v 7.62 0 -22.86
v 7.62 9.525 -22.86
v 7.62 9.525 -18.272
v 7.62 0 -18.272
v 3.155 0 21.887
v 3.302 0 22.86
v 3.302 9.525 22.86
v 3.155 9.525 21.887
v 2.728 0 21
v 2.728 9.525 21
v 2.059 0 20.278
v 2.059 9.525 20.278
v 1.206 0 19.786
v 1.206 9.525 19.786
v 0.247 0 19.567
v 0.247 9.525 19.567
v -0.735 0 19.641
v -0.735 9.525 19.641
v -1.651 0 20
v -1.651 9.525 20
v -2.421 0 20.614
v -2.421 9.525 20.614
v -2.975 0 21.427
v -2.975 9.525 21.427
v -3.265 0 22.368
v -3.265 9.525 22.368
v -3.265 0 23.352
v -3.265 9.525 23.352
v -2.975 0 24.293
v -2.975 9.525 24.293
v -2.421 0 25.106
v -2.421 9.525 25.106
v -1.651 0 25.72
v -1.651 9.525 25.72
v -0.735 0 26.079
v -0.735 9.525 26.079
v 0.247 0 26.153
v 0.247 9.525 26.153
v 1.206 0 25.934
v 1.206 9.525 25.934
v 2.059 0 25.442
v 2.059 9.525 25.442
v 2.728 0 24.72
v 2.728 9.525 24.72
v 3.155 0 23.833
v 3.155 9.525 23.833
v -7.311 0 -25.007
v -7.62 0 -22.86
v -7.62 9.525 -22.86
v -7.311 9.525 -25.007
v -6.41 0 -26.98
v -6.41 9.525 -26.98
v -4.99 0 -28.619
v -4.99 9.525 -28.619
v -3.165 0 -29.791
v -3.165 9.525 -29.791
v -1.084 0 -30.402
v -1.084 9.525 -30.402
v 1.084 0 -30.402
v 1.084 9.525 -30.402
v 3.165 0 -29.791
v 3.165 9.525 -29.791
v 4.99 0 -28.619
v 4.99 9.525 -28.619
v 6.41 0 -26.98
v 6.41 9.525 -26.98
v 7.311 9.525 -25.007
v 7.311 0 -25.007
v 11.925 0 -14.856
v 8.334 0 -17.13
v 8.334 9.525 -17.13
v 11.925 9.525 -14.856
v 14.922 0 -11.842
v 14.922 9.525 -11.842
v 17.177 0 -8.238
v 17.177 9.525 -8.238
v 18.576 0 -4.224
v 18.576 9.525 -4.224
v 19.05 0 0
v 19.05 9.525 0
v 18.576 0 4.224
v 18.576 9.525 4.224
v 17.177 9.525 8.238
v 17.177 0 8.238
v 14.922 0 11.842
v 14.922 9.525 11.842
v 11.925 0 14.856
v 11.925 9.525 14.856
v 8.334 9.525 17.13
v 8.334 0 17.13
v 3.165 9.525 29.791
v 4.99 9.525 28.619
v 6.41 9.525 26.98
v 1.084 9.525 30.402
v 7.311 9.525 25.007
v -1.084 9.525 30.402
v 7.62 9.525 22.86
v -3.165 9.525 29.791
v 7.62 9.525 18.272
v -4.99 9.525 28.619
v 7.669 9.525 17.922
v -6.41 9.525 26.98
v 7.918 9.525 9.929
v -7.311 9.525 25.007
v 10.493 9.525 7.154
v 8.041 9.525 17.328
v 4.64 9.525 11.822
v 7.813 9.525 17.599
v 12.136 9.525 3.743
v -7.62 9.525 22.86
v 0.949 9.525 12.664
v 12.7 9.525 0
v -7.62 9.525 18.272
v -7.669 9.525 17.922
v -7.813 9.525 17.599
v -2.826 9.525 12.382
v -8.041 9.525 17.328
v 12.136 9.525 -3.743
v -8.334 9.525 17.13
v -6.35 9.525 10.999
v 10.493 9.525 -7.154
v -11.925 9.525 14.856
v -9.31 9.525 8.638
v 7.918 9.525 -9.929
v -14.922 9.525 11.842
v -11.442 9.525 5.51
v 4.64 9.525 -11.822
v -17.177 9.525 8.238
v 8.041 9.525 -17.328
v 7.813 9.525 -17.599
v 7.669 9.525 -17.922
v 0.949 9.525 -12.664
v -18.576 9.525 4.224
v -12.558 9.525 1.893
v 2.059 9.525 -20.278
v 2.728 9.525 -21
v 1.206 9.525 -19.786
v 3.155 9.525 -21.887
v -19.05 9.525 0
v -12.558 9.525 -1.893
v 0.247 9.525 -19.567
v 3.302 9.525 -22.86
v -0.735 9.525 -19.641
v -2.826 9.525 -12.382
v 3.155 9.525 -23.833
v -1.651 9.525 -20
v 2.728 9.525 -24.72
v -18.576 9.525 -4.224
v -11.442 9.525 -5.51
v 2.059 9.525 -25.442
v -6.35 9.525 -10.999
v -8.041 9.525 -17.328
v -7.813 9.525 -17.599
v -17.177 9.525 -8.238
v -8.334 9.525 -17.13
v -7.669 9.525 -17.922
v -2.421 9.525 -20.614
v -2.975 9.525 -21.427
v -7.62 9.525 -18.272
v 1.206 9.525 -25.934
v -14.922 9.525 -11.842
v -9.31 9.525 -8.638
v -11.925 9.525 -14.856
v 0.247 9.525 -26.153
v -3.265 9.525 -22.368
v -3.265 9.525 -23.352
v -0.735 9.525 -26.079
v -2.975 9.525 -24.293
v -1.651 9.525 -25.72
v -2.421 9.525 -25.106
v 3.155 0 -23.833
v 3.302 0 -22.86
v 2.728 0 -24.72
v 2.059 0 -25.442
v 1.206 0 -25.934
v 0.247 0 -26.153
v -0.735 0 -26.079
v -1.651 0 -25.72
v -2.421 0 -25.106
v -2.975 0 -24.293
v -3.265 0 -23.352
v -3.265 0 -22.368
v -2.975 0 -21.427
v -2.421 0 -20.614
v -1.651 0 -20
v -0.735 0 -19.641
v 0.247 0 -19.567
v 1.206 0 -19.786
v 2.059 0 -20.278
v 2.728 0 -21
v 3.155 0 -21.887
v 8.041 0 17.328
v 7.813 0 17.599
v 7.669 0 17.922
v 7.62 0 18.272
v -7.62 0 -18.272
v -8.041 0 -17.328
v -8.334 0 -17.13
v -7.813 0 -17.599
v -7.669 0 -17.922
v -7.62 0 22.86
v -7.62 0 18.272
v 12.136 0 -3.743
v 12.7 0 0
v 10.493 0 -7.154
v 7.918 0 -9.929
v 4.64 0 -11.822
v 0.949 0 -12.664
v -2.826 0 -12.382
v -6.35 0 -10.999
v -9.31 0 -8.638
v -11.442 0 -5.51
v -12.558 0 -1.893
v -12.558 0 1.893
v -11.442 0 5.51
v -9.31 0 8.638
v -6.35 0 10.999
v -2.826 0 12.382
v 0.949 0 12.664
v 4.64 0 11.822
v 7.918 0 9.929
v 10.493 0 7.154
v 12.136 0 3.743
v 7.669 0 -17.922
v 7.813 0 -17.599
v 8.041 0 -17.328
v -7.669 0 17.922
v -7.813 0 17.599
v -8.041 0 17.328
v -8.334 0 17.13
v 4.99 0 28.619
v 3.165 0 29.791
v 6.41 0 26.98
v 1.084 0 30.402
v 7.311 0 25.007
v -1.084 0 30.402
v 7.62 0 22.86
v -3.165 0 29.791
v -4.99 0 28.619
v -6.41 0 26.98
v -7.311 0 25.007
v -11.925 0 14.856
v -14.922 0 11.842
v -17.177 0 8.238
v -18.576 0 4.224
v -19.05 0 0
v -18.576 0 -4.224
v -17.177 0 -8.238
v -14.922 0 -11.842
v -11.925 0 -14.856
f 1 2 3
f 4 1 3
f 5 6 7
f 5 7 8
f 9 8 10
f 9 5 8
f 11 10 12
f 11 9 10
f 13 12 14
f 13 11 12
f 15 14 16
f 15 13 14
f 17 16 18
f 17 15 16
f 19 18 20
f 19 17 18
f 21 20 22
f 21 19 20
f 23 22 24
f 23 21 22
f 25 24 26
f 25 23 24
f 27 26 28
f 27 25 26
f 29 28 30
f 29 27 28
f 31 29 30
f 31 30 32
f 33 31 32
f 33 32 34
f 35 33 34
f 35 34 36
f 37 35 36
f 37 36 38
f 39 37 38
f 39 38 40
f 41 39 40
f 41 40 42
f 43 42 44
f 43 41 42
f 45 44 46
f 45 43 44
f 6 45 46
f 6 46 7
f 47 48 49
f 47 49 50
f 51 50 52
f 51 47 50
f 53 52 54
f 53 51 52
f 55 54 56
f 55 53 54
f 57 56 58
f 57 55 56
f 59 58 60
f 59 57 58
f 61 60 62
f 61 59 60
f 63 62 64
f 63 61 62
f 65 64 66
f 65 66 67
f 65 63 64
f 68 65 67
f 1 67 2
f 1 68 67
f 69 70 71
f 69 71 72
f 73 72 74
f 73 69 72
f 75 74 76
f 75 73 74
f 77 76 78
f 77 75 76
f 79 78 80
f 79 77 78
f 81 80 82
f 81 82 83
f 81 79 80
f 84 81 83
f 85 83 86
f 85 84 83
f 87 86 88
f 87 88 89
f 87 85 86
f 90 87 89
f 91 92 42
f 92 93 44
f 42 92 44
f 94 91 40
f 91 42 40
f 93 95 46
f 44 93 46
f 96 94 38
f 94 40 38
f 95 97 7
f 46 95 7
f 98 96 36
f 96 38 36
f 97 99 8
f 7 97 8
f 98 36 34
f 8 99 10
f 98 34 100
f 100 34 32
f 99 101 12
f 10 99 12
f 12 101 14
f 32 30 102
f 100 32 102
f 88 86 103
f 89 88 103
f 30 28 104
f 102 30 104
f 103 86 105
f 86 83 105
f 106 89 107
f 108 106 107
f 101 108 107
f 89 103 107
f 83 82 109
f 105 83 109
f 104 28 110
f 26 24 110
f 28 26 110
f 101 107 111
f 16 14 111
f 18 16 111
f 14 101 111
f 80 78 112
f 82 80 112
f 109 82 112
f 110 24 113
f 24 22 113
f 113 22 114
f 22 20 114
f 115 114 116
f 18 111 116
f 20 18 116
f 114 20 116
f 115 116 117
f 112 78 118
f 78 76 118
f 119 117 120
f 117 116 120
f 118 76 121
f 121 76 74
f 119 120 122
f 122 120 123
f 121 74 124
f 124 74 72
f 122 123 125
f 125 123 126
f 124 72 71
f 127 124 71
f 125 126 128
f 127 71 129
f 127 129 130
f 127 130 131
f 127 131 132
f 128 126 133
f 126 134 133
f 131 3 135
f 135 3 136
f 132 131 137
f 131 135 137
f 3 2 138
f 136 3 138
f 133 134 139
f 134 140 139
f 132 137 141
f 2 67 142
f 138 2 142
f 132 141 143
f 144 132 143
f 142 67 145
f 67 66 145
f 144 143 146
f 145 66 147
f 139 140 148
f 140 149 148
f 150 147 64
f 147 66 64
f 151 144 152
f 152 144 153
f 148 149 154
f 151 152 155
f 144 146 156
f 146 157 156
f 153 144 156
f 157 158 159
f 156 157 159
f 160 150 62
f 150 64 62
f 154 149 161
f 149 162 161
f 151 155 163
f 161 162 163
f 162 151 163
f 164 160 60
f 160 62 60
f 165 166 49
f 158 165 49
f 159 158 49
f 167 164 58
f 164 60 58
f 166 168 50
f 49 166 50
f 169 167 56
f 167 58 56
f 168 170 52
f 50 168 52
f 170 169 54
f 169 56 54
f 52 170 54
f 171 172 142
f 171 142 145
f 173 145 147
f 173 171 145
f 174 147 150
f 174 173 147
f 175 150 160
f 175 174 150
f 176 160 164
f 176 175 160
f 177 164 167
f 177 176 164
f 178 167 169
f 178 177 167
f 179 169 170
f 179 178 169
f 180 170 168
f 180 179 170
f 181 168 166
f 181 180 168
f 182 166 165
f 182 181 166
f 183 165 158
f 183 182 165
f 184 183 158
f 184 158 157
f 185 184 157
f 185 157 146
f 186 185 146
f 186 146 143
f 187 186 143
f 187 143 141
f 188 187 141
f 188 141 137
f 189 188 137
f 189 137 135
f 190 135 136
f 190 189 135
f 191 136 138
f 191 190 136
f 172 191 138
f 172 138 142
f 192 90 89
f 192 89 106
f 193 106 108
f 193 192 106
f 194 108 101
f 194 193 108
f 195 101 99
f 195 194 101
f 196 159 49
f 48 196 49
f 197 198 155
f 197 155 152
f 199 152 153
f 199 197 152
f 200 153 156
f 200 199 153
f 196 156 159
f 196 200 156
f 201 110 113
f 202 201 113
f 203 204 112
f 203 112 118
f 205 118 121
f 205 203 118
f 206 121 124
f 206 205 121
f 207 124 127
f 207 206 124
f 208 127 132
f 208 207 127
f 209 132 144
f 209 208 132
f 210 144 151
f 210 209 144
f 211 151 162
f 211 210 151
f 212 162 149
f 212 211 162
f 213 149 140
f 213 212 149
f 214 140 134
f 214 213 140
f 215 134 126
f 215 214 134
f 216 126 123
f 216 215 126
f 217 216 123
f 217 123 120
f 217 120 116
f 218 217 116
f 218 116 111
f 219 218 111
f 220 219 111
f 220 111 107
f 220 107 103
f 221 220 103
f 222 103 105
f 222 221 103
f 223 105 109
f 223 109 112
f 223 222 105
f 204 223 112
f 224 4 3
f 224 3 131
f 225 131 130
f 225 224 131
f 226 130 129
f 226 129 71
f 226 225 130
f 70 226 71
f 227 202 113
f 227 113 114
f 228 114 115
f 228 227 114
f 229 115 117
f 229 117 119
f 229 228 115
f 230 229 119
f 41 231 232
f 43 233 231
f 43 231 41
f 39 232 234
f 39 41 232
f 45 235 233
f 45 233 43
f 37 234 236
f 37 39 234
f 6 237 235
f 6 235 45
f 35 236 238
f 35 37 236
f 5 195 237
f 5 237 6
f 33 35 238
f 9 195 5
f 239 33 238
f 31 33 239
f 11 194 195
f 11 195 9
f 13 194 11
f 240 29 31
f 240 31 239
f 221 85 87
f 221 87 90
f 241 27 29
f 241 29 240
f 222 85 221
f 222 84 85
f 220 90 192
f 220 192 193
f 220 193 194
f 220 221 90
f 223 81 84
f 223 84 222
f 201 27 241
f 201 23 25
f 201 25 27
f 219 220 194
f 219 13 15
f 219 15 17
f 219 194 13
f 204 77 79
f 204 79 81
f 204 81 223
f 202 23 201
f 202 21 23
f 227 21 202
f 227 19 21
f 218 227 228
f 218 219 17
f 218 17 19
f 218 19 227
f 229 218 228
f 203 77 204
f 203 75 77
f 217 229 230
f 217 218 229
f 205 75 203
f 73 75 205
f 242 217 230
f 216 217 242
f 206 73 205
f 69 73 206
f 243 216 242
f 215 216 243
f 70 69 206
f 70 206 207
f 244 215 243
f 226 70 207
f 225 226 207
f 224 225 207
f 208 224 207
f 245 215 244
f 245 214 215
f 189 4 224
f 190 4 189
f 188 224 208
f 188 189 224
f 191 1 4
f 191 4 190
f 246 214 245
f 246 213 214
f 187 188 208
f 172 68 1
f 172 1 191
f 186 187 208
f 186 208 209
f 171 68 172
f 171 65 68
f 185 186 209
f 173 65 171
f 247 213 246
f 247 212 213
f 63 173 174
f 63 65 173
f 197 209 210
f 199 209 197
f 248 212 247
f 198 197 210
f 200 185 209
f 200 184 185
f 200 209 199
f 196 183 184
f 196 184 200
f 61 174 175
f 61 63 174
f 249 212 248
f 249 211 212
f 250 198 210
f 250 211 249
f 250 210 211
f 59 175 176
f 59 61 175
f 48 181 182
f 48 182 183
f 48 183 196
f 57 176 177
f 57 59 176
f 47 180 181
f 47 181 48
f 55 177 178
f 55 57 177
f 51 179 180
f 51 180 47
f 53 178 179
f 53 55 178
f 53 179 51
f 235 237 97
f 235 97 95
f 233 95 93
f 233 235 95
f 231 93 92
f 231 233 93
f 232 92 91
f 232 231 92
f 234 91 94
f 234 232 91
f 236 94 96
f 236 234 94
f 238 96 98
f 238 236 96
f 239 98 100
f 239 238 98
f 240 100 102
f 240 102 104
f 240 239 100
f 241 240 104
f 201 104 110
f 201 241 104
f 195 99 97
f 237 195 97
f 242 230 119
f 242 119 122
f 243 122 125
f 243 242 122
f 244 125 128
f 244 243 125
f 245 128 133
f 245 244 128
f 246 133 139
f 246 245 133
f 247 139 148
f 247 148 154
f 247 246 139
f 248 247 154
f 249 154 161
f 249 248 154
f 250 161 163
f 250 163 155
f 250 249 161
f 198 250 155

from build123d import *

# Parameters (mm, degrees)
SKETCH1_R           = 12.7
SKETCH1_R_2         = 3.302
BOSS_EXTRUDE1_DEPTH = 9.525


with BuildPart() as part:
    # Sketch1 → Boss-Extrude1 (new body)
    with BuildSketch(Plane(origin=(0, 0, 0), x_dir=(1, 0, 0), z_dir=(0, 1, 0))):
        with BuildLine():
            Line((7.62, 22.86), (7.62, 18.272118104))
            ThreePointArc((7.62, 18.272118104), (7.813305115, 17.598598895), (8.334375, 17.130110722))
            ThreePointArc((8.334375, 17.130110722), (19.05, 0), (8.334375, -17.130110722))
            ThreePointArc((8.334375, -17.130110722), (7.813305115, -17.598598895), (7.62, -18.272118104))
            Line((7.62, -18.272118104), (7.62, -22.86))
            ThreePointArc((7.62, -22.86), (0, -30.48), (-7.62, -22.86))
            Line((-7.62, -22.86), (-7.62, -18.272118104))
            ThreePointArc((-7.62, -18.272118104), (-7.813305115, -17.598598895), (-8.334375, -17.130110722))
            ThreePointArc((-8.334375, -17.130110722), (-19.05, 0), (-8.334375, 17.130110722))
            ThreePointArc((-8.334375, 17.130110722), (-7.813305115, 17.598598895), (-7.62, 18.272118104))
            Line((-7.62, 18.272118104), (-7.62, 22.86))
            ThreePointArc((-7.62, 22.86), (0, 30.48), (7.62, 22.86))
        make_face()
        Circle(SKETCH1_R, mode=Mode.SUBTRACT)
        with Locations((0, 22.86)):
            Circle(SKETCH1_R_2, mode=Mode.SUBTRACT)
        with Locations((0, -22.86)):
            Circle(SKETCH1_R_2, mode=Mode.SUBTRACT)
    extrude(amount=BOSS_EXTRUDE1_DEPTH)


solid = part.part
